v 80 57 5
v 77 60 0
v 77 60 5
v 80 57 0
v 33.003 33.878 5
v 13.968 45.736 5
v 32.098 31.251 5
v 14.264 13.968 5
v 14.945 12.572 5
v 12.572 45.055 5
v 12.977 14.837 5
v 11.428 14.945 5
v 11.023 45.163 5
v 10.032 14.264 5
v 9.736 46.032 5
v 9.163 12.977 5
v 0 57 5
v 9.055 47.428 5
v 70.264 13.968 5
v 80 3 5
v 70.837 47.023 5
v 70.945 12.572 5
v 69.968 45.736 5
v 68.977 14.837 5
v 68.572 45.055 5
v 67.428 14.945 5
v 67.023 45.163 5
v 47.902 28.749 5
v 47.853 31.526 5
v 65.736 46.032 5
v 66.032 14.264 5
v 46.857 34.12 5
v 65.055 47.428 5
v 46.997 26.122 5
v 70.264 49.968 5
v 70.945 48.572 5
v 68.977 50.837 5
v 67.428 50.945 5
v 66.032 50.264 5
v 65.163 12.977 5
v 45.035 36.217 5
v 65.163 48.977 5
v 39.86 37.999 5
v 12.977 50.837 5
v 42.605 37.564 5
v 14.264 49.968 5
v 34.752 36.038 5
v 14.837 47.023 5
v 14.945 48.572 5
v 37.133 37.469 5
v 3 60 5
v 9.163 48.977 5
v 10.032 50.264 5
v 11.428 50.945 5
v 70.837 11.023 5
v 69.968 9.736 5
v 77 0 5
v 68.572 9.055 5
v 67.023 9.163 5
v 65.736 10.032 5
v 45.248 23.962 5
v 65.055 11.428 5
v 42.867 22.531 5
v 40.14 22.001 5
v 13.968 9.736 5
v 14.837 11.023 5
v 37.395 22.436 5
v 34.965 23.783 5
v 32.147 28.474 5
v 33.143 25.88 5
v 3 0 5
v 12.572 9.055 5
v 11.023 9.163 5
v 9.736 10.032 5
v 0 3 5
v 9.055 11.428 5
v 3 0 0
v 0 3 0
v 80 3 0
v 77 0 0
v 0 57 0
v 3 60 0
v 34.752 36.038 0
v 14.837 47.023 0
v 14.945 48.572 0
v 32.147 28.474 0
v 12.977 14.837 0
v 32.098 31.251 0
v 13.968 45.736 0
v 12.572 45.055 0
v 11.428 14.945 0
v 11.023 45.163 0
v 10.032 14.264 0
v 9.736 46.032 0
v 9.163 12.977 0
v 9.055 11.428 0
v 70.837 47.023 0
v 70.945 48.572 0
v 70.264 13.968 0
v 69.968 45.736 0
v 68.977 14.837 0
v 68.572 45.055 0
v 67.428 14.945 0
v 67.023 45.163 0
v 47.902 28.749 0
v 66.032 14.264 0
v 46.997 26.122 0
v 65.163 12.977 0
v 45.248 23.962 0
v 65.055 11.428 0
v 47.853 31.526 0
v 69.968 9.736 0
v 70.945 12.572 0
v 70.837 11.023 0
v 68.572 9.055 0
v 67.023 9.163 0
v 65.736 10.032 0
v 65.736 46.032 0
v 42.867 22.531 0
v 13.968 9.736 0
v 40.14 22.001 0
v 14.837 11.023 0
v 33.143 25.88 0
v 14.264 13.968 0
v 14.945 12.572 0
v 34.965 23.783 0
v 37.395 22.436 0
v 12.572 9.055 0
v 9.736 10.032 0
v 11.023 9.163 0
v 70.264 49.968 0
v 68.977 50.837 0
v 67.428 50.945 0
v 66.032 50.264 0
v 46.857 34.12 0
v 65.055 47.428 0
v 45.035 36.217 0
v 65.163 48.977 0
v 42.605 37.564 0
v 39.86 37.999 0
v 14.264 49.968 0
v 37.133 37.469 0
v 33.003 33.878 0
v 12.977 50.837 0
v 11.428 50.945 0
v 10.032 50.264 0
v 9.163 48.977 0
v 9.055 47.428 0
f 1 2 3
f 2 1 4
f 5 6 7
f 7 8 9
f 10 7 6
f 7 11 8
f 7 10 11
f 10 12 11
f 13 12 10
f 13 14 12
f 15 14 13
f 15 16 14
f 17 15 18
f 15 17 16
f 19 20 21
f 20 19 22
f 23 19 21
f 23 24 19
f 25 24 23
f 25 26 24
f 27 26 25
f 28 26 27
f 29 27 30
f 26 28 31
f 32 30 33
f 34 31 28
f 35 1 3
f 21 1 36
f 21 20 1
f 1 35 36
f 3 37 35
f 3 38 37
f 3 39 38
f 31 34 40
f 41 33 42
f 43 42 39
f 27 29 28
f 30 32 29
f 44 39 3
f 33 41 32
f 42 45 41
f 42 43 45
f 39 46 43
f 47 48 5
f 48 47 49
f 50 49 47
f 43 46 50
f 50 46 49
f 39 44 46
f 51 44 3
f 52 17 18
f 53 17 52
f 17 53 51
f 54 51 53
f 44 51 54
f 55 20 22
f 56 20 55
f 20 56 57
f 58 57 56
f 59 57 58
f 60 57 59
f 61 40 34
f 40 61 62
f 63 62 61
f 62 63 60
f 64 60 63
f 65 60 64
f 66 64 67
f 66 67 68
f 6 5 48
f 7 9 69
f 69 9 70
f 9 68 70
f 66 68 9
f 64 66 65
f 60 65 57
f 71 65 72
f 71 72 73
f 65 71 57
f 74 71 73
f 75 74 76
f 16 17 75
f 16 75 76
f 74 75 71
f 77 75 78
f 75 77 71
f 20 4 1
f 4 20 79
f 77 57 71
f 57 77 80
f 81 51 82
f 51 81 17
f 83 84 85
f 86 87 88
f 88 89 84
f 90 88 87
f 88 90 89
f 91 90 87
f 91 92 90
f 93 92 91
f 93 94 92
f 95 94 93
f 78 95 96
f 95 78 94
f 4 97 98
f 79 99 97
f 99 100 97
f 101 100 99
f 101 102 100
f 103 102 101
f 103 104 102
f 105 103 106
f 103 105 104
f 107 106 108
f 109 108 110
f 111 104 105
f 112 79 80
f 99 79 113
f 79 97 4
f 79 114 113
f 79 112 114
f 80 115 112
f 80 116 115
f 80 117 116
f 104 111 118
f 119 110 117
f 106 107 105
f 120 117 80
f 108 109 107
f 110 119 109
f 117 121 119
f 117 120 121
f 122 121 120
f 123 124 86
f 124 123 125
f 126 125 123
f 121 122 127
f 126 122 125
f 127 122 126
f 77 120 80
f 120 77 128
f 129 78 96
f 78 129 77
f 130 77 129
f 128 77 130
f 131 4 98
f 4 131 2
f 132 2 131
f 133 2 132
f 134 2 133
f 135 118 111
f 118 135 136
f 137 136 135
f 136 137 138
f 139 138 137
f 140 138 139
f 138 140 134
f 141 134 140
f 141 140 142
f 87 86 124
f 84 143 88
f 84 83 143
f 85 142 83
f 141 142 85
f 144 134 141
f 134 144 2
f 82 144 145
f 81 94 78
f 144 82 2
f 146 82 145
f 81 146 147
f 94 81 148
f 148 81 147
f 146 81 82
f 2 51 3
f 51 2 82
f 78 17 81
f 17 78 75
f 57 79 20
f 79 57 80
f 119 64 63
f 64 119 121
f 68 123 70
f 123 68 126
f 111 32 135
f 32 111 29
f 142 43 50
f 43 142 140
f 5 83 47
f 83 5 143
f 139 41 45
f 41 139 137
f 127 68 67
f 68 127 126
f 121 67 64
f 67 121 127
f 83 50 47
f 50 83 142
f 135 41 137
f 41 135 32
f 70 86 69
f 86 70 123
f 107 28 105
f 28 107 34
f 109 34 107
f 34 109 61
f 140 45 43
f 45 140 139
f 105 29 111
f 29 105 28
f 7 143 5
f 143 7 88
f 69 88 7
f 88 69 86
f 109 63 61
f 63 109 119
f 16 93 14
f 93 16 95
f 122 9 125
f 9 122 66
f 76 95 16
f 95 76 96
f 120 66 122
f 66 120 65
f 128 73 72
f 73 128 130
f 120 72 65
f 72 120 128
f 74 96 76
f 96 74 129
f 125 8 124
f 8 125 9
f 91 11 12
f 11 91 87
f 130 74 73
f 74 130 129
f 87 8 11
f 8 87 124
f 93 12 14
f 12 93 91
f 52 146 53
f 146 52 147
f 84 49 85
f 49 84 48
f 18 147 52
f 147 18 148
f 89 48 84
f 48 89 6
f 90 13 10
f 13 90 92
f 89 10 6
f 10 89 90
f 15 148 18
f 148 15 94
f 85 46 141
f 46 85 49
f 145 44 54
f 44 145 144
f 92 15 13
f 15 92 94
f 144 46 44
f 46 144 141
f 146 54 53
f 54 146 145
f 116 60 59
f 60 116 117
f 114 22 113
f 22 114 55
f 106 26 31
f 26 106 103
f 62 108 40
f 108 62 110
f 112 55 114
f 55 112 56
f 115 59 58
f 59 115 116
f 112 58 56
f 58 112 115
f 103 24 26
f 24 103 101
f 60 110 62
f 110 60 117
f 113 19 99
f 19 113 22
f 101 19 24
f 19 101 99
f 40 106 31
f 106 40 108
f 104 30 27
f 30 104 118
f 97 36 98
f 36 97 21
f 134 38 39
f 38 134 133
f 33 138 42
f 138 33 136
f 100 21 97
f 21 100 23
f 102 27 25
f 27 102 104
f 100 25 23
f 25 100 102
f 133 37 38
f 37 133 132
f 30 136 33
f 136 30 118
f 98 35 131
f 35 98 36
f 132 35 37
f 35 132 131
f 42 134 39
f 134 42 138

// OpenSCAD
$fn = 32;

// ----------------------------------------------------------------------
// Spacer plate: rect 80 x 60
// ----------------------------------------------------------------------

// --- parameters (mm) ---
bore_r = 8;               // centre bore radius
bolt_r = 3;               // bolt hole radius
plate_t = 5;              // plate thickness, Z (extrusion height)
plate_l = 80;             // plate length, X
plate_w = 60;             // plate width, Y
inset = 12;               // corner hole inset

profile = [[3, 0], [77, 0], [80, 3], [80, 57], [77, 60], [3, 60], [0, 57], [0, 3]];  // primary outline, 8 points, counter clockwise
void_1 = [[47.853, 31.526], [46.857, 34.12], [45.035, 36.217], [42.605, 37.564], [39.86, 37.999], [37.133, 37.469], [34.752, 36.038], [33.003, 33.878], [32.098, 31.251], [32.147, 28.474], [33.143, 25.88], [34.965, 23.783], [37.395, 22.436], [40.14, 22.001], [42.867, 22.531], [45.248, 23.962], [46.997, 26.122], [47.902, 28.749]];  // centre bore, 18 points
void_2 = [[14.945, 12.572], [14.264, 13.968], [12.977, 14.837], [11.428, 14.945], [10.032, 14.264], [9.163, 12.977], [9.055, 11.428], [9.736, 10.032], [11.023, 9.163], [12.572, 9.055], [13.968, 9.736], [14.837, 11.023]];  // corner hole, 12 points
void_3 = [[14.945, 48.572], [14.264, 49.968], [12.977, 50.837], [11.428, 50.945], [10.032, 50.264], [9.163, 48.977], [9.055, 47.428], [9.736, 46.032], [11.023, 45.163], [12.572, 45.055], [13.968, 45.736], [14.837, 47.023]];  // corner hole, 12 points
void_4 = [[70.945, 12.572], [70.264, 13.968], [68.977, 14.837], [67.428, 14.945], [66.032, 14.264], [65.163, 12.977], [65.055, 11.428], [65.736, 10.032], [67.023, 9.163], [68.572, 9.055], [69.968, 9.736], [70.837, 11.023]];  // corner hole, 12 points
void_5 = [[70.945, 48.572], [70.264, 49.968], [68.977, 50.837], [67.428, 50.945], [66.032, 50.264], [65.163, 48.977], [65.055, 47.428], [65.736, 46.032], [67.023, 45.163], [68.572, 45.055], [69.968, 45.736], [70.837, 47.023]];  // corner hole, 12 points

// --- the one profile operation ---
difference() {
  linear_extrude(height = plate_t) polygon(points = profile);
  translate([0, 0, -1])
    linear_extrude(height = plate_t + 2) polygon(points = void_1);
  translate([0, 0, -1])
    linear_extrude(height = plate_t + 2) polygon(points = void_2);
  translate([0, 0, -1])
    linear_extrude(height = plate_t + 2) polygon(points = void_3);
  translate([0, 0, -1])
    linear_extrude(height = plate_t + 2) polygon(points = void_4);
  translate([0, 0, -1])
    linear_extrude(height = plate_t + 2) polygon(points = void_5);
}
